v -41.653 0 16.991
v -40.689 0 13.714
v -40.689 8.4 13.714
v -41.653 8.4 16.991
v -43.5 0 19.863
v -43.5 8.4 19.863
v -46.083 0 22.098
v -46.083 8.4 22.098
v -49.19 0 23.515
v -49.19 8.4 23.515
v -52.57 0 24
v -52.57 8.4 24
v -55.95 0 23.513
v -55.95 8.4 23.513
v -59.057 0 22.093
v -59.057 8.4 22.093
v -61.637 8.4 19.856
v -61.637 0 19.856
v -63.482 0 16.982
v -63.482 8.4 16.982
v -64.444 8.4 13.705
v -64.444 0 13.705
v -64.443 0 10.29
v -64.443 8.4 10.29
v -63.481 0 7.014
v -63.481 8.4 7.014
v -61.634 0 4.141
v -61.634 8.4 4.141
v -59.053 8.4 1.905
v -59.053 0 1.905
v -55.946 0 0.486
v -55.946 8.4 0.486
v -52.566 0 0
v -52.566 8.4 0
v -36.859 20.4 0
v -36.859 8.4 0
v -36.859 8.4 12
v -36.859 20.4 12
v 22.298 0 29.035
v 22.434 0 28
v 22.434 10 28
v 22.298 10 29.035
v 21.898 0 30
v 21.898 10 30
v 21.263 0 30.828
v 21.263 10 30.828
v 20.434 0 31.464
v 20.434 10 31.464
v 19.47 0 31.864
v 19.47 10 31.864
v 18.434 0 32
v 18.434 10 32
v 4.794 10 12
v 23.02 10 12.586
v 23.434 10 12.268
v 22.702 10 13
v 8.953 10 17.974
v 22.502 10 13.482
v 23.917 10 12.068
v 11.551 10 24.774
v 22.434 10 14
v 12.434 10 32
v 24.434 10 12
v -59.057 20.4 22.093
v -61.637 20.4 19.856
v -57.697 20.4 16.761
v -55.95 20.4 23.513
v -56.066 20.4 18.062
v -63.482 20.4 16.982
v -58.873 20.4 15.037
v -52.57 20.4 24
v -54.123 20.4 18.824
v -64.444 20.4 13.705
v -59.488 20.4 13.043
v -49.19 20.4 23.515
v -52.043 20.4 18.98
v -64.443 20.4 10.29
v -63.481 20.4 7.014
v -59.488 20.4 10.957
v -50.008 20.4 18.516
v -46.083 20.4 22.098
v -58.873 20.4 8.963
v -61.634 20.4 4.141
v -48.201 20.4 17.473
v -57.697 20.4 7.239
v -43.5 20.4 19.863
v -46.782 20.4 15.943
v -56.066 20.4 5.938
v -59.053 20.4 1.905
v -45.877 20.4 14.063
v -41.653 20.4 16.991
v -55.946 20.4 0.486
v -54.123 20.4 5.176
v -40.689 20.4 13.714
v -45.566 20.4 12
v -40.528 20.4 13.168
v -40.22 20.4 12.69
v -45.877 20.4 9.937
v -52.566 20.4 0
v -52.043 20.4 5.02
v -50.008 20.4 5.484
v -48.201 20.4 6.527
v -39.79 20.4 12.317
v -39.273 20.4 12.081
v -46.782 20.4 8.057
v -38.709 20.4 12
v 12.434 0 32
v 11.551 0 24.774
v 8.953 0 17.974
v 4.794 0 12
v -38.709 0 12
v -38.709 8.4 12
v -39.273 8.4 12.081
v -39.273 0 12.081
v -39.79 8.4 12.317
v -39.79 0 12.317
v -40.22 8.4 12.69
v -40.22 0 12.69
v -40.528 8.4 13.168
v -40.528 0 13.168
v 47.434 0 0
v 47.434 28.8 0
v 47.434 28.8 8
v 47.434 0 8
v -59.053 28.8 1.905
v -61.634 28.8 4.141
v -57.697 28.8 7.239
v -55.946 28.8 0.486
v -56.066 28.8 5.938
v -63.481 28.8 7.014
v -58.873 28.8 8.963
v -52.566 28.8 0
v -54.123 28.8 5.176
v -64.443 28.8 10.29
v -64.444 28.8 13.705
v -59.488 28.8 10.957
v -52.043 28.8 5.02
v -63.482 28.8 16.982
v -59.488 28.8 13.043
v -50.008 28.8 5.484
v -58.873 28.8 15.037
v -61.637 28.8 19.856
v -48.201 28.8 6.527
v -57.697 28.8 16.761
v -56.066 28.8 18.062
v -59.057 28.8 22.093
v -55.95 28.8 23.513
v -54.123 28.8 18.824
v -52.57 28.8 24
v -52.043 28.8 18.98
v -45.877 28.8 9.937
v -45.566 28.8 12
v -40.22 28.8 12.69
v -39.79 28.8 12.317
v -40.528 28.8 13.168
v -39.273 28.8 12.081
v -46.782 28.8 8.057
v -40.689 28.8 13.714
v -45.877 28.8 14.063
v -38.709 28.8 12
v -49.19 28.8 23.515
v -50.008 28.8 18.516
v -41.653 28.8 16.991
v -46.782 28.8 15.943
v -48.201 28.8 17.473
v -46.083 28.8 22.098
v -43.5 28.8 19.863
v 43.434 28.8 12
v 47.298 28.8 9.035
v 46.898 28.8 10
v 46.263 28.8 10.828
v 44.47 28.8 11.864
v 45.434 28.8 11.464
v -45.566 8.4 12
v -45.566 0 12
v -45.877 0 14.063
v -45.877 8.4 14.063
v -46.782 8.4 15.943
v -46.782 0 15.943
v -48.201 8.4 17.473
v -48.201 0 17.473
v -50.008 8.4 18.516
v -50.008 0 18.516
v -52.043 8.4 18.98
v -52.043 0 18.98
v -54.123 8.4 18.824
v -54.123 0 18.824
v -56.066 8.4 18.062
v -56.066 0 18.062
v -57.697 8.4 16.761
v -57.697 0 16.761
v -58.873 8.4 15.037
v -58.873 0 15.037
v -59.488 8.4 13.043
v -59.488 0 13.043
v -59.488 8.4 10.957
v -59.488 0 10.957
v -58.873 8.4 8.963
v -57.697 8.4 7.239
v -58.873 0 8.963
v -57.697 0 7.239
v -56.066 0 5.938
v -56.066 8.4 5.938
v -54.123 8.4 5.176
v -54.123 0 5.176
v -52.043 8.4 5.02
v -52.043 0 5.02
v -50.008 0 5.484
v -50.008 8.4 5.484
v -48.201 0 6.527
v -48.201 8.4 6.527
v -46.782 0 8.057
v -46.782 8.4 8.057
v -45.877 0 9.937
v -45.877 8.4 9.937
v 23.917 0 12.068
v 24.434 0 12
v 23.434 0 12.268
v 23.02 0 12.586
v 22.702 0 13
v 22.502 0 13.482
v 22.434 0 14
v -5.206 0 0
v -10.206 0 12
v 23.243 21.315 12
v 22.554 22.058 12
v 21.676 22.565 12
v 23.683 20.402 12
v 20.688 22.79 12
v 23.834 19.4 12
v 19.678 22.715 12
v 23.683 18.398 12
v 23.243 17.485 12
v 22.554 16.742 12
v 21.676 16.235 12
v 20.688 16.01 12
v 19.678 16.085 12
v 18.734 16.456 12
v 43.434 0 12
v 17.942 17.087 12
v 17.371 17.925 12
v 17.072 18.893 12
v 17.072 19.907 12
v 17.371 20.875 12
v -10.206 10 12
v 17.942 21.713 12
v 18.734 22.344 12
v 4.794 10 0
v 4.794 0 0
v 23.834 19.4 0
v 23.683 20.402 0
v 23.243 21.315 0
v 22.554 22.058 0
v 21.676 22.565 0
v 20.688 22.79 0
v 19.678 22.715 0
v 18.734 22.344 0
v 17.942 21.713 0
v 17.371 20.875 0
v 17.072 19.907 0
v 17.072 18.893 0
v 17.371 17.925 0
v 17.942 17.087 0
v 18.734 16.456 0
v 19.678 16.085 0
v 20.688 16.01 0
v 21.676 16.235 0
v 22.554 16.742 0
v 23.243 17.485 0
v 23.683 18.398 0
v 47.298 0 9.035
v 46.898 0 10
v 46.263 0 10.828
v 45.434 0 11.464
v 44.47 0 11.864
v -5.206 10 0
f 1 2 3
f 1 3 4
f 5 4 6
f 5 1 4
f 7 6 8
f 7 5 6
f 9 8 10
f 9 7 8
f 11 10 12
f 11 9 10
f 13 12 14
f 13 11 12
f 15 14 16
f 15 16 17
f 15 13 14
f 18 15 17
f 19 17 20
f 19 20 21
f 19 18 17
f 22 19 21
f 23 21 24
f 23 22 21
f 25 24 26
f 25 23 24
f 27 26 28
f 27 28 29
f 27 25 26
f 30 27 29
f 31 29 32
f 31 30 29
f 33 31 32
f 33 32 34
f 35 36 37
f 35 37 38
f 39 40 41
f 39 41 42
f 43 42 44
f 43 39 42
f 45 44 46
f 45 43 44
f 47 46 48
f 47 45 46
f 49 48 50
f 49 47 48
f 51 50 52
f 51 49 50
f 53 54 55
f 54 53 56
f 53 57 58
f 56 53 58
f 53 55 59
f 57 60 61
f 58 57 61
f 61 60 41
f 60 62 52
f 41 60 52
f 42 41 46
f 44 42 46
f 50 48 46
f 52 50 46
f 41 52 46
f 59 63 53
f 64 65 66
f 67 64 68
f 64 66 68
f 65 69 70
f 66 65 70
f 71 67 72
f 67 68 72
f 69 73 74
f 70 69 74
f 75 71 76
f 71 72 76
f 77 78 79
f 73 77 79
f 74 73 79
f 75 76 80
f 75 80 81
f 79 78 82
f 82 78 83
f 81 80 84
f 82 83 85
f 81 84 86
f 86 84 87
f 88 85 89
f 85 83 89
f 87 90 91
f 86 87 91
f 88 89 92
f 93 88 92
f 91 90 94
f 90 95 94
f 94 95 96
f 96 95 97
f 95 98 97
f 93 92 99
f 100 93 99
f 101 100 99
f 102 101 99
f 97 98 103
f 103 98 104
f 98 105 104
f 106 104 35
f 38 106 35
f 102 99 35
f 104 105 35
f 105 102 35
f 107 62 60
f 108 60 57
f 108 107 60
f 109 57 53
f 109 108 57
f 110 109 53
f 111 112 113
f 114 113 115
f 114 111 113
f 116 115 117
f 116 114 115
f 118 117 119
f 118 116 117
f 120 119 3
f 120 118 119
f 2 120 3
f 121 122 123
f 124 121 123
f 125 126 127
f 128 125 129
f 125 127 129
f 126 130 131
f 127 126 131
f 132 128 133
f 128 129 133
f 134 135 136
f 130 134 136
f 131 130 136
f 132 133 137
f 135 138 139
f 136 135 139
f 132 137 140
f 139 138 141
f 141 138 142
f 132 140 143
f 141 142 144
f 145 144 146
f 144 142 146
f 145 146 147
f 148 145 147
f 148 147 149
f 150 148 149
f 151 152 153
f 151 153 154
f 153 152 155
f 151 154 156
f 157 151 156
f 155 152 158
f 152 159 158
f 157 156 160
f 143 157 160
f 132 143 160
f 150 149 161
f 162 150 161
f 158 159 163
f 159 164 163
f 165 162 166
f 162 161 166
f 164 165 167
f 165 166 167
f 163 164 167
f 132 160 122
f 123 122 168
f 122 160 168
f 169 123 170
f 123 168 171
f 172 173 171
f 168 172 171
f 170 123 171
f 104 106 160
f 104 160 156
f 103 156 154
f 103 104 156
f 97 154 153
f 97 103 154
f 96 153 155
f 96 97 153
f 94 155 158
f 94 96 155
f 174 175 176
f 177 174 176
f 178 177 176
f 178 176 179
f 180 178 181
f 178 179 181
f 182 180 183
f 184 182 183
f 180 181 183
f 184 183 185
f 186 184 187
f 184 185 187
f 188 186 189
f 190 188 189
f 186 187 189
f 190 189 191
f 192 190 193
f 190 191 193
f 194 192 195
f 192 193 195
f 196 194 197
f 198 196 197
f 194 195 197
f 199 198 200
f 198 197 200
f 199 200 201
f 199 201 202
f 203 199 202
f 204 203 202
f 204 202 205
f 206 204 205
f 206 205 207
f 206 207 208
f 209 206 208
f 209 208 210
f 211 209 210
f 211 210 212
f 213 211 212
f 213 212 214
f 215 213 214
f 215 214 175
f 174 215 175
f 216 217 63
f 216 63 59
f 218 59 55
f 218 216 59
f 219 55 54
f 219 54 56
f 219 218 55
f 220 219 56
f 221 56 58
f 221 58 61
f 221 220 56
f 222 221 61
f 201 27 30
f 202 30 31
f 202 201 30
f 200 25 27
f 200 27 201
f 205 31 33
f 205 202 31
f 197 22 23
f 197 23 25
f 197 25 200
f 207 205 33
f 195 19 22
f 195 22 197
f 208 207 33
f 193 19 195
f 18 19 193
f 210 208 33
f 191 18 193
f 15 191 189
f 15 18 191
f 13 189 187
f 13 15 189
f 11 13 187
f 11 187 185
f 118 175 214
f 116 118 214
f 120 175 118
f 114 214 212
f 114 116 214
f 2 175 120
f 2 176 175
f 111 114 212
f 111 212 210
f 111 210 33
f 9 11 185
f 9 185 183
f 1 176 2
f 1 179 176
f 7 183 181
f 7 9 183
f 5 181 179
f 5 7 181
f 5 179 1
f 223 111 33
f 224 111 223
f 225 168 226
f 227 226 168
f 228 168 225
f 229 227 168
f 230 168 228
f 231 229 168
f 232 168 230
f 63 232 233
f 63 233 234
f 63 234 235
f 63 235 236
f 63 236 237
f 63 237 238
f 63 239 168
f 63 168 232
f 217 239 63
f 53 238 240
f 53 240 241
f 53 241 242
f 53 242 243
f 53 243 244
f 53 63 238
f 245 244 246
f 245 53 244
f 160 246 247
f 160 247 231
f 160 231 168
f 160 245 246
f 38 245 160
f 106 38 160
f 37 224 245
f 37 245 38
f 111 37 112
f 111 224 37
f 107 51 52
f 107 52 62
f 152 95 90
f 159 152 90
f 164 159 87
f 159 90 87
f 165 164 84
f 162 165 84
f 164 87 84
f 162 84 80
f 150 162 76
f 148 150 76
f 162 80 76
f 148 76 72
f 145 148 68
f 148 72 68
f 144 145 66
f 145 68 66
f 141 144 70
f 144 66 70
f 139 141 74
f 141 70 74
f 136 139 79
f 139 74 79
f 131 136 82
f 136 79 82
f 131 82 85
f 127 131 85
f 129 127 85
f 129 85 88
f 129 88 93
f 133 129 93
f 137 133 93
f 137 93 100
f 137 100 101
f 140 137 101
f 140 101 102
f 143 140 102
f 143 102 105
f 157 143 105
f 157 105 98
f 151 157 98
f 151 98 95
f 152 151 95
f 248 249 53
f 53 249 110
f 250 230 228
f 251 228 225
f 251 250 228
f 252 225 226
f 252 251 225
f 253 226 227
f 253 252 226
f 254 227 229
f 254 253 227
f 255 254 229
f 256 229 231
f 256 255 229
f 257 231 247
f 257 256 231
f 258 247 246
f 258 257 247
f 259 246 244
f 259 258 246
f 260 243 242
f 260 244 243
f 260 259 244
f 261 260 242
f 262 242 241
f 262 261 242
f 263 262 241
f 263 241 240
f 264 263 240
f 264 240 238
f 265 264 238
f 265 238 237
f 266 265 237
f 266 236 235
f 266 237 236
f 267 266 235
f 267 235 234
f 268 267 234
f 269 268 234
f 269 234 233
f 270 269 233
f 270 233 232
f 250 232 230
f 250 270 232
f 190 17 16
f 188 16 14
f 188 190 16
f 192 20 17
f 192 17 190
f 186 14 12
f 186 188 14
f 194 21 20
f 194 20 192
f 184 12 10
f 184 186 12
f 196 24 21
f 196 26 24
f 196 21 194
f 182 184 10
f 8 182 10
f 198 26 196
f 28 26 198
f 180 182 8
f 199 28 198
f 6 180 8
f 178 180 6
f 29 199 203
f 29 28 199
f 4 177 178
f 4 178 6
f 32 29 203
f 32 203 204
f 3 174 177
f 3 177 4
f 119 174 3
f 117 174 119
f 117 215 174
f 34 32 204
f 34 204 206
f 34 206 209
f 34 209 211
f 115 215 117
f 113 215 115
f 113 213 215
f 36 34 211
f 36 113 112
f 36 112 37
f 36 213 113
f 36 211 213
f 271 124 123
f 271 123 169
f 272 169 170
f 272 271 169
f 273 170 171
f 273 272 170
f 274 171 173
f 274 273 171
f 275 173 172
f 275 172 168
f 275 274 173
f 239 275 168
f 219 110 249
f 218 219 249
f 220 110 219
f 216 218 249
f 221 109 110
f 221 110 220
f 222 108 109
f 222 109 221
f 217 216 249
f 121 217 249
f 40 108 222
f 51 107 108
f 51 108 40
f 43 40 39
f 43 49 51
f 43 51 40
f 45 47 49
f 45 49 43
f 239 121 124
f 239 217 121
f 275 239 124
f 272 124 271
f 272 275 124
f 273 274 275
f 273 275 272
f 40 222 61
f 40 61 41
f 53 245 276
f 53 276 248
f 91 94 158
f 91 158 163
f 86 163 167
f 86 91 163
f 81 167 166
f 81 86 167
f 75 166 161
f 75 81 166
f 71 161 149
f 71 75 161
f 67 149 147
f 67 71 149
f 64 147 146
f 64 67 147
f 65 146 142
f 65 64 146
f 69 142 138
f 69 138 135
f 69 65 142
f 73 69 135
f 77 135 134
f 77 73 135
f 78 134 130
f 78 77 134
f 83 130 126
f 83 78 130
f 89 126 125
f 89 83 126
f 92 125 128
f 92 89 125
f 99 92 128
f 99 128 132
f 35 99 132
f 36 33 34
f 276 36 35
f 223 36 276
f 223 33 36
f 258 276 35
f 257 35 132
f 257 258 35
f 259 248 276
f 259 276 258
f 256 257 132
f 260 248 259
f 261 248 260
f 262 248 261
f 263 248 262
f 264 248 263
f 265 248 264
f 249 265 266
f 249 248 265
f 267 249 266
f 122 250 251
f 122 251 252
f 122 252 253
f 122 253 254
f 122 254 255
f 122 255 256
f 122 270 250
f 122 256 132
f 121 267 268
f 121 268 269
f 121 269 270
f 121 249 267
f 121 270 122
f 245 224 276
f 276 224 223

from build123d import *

# Parameters (mm, degrees)
F0_R     = 7
F1_DEPTH = 28.8
F2_DEPTH = 10
F3_DEPTH = 10
F4_W     = 27.706493
F4_H     = 12
F4_R     = 3.4
F5_DEPTH = 29.9


with BuildPart() as f1:
    # F0 (on Front) → F1 (new body)
    with BuildSketch(Plane.XZ):
        with BuildLine():
            ThreePointArc((-40.688801, 13.714286), (-61.636868, 19.855844), (-52.56572, 0))
            Line((-52.56572, 0), (-5.20572, 0))
            Line((-5.20572, 0), (-10.20572, 12))
            Line((-10.20572, 12), (-38.709314, 12))
            ThreePointArc((-38.709314, 12), (-40.018621, 12.488142), (-40.688801, 13.714286))
        make_face()
        with Locations((-52.56572, 12)):
            Circle(F0_R, mode=Mode.SUBTRACT)
        with BuildLine():
            Line((4.79428, 12), (4.79428, 0))
            Line((4.79428, 0), (47.43428, 0))
            Line((47.43428, 0), (47.43428, 8))
            ThreePointArc((47.43428, 8), (46.262707, 10.828427), (43.43428, 12))
            Line((43.43428, 12), (24.43428, 12))
            Line((24.43428, 12), (4.79428, 12))
        make_face()
        Polygon((-10.20572, 12), (-5.20572, 0), (4.79428, 0), (4.79428, 12), align=None)
    extrude(amount=-F1_DEPTH)

    # F0 (on Front) → F2 (join)
    with BuildSketch(Plane.XZ):
        with BuildLine():
            ThreePointArc((12.43428, 32), (10.459133, 21.295266), (4.79428, 12))
            Line((4.79428, 12), (24.43428, 12))
            ThreePointArc((24.43428, 12), (23.020066, 12.585786), (22.43428, 14))
            Line((22.43428, 14), (22.43428, 28))
            ThreePointArc((22.43428, 28), (21.262707, 30.828427), (18.43428, 32))
            Line((18.43428, 32), (12.43428, 32))
        make_face()
    extrude(amount=-F2_DEPTH)

    # F0 (on Front) → F3 (cut)
    with BuildSketch(Plane.XZ):
        Polygon((-10.20572, 12), (-5.20572, 0), (4.79428, 0), (4.79428, 12), align=None)
    extrude(amount=-F3_DEPTH, mode=Mode.SUBTRACT)

    # F4 (on Top) → F5 (cut)
    with BuildSketch(Plane.XY):
        with Locations((-50.712474, 14.4)):
            Rectangle(F4_W, F4_H)
        with Locations((20.43428, 19.4)):
            Circle(F4_R)
    extrude(amount=F5_DEPTH, mode=Mode.SUBTRACT)


solid = f1.part
